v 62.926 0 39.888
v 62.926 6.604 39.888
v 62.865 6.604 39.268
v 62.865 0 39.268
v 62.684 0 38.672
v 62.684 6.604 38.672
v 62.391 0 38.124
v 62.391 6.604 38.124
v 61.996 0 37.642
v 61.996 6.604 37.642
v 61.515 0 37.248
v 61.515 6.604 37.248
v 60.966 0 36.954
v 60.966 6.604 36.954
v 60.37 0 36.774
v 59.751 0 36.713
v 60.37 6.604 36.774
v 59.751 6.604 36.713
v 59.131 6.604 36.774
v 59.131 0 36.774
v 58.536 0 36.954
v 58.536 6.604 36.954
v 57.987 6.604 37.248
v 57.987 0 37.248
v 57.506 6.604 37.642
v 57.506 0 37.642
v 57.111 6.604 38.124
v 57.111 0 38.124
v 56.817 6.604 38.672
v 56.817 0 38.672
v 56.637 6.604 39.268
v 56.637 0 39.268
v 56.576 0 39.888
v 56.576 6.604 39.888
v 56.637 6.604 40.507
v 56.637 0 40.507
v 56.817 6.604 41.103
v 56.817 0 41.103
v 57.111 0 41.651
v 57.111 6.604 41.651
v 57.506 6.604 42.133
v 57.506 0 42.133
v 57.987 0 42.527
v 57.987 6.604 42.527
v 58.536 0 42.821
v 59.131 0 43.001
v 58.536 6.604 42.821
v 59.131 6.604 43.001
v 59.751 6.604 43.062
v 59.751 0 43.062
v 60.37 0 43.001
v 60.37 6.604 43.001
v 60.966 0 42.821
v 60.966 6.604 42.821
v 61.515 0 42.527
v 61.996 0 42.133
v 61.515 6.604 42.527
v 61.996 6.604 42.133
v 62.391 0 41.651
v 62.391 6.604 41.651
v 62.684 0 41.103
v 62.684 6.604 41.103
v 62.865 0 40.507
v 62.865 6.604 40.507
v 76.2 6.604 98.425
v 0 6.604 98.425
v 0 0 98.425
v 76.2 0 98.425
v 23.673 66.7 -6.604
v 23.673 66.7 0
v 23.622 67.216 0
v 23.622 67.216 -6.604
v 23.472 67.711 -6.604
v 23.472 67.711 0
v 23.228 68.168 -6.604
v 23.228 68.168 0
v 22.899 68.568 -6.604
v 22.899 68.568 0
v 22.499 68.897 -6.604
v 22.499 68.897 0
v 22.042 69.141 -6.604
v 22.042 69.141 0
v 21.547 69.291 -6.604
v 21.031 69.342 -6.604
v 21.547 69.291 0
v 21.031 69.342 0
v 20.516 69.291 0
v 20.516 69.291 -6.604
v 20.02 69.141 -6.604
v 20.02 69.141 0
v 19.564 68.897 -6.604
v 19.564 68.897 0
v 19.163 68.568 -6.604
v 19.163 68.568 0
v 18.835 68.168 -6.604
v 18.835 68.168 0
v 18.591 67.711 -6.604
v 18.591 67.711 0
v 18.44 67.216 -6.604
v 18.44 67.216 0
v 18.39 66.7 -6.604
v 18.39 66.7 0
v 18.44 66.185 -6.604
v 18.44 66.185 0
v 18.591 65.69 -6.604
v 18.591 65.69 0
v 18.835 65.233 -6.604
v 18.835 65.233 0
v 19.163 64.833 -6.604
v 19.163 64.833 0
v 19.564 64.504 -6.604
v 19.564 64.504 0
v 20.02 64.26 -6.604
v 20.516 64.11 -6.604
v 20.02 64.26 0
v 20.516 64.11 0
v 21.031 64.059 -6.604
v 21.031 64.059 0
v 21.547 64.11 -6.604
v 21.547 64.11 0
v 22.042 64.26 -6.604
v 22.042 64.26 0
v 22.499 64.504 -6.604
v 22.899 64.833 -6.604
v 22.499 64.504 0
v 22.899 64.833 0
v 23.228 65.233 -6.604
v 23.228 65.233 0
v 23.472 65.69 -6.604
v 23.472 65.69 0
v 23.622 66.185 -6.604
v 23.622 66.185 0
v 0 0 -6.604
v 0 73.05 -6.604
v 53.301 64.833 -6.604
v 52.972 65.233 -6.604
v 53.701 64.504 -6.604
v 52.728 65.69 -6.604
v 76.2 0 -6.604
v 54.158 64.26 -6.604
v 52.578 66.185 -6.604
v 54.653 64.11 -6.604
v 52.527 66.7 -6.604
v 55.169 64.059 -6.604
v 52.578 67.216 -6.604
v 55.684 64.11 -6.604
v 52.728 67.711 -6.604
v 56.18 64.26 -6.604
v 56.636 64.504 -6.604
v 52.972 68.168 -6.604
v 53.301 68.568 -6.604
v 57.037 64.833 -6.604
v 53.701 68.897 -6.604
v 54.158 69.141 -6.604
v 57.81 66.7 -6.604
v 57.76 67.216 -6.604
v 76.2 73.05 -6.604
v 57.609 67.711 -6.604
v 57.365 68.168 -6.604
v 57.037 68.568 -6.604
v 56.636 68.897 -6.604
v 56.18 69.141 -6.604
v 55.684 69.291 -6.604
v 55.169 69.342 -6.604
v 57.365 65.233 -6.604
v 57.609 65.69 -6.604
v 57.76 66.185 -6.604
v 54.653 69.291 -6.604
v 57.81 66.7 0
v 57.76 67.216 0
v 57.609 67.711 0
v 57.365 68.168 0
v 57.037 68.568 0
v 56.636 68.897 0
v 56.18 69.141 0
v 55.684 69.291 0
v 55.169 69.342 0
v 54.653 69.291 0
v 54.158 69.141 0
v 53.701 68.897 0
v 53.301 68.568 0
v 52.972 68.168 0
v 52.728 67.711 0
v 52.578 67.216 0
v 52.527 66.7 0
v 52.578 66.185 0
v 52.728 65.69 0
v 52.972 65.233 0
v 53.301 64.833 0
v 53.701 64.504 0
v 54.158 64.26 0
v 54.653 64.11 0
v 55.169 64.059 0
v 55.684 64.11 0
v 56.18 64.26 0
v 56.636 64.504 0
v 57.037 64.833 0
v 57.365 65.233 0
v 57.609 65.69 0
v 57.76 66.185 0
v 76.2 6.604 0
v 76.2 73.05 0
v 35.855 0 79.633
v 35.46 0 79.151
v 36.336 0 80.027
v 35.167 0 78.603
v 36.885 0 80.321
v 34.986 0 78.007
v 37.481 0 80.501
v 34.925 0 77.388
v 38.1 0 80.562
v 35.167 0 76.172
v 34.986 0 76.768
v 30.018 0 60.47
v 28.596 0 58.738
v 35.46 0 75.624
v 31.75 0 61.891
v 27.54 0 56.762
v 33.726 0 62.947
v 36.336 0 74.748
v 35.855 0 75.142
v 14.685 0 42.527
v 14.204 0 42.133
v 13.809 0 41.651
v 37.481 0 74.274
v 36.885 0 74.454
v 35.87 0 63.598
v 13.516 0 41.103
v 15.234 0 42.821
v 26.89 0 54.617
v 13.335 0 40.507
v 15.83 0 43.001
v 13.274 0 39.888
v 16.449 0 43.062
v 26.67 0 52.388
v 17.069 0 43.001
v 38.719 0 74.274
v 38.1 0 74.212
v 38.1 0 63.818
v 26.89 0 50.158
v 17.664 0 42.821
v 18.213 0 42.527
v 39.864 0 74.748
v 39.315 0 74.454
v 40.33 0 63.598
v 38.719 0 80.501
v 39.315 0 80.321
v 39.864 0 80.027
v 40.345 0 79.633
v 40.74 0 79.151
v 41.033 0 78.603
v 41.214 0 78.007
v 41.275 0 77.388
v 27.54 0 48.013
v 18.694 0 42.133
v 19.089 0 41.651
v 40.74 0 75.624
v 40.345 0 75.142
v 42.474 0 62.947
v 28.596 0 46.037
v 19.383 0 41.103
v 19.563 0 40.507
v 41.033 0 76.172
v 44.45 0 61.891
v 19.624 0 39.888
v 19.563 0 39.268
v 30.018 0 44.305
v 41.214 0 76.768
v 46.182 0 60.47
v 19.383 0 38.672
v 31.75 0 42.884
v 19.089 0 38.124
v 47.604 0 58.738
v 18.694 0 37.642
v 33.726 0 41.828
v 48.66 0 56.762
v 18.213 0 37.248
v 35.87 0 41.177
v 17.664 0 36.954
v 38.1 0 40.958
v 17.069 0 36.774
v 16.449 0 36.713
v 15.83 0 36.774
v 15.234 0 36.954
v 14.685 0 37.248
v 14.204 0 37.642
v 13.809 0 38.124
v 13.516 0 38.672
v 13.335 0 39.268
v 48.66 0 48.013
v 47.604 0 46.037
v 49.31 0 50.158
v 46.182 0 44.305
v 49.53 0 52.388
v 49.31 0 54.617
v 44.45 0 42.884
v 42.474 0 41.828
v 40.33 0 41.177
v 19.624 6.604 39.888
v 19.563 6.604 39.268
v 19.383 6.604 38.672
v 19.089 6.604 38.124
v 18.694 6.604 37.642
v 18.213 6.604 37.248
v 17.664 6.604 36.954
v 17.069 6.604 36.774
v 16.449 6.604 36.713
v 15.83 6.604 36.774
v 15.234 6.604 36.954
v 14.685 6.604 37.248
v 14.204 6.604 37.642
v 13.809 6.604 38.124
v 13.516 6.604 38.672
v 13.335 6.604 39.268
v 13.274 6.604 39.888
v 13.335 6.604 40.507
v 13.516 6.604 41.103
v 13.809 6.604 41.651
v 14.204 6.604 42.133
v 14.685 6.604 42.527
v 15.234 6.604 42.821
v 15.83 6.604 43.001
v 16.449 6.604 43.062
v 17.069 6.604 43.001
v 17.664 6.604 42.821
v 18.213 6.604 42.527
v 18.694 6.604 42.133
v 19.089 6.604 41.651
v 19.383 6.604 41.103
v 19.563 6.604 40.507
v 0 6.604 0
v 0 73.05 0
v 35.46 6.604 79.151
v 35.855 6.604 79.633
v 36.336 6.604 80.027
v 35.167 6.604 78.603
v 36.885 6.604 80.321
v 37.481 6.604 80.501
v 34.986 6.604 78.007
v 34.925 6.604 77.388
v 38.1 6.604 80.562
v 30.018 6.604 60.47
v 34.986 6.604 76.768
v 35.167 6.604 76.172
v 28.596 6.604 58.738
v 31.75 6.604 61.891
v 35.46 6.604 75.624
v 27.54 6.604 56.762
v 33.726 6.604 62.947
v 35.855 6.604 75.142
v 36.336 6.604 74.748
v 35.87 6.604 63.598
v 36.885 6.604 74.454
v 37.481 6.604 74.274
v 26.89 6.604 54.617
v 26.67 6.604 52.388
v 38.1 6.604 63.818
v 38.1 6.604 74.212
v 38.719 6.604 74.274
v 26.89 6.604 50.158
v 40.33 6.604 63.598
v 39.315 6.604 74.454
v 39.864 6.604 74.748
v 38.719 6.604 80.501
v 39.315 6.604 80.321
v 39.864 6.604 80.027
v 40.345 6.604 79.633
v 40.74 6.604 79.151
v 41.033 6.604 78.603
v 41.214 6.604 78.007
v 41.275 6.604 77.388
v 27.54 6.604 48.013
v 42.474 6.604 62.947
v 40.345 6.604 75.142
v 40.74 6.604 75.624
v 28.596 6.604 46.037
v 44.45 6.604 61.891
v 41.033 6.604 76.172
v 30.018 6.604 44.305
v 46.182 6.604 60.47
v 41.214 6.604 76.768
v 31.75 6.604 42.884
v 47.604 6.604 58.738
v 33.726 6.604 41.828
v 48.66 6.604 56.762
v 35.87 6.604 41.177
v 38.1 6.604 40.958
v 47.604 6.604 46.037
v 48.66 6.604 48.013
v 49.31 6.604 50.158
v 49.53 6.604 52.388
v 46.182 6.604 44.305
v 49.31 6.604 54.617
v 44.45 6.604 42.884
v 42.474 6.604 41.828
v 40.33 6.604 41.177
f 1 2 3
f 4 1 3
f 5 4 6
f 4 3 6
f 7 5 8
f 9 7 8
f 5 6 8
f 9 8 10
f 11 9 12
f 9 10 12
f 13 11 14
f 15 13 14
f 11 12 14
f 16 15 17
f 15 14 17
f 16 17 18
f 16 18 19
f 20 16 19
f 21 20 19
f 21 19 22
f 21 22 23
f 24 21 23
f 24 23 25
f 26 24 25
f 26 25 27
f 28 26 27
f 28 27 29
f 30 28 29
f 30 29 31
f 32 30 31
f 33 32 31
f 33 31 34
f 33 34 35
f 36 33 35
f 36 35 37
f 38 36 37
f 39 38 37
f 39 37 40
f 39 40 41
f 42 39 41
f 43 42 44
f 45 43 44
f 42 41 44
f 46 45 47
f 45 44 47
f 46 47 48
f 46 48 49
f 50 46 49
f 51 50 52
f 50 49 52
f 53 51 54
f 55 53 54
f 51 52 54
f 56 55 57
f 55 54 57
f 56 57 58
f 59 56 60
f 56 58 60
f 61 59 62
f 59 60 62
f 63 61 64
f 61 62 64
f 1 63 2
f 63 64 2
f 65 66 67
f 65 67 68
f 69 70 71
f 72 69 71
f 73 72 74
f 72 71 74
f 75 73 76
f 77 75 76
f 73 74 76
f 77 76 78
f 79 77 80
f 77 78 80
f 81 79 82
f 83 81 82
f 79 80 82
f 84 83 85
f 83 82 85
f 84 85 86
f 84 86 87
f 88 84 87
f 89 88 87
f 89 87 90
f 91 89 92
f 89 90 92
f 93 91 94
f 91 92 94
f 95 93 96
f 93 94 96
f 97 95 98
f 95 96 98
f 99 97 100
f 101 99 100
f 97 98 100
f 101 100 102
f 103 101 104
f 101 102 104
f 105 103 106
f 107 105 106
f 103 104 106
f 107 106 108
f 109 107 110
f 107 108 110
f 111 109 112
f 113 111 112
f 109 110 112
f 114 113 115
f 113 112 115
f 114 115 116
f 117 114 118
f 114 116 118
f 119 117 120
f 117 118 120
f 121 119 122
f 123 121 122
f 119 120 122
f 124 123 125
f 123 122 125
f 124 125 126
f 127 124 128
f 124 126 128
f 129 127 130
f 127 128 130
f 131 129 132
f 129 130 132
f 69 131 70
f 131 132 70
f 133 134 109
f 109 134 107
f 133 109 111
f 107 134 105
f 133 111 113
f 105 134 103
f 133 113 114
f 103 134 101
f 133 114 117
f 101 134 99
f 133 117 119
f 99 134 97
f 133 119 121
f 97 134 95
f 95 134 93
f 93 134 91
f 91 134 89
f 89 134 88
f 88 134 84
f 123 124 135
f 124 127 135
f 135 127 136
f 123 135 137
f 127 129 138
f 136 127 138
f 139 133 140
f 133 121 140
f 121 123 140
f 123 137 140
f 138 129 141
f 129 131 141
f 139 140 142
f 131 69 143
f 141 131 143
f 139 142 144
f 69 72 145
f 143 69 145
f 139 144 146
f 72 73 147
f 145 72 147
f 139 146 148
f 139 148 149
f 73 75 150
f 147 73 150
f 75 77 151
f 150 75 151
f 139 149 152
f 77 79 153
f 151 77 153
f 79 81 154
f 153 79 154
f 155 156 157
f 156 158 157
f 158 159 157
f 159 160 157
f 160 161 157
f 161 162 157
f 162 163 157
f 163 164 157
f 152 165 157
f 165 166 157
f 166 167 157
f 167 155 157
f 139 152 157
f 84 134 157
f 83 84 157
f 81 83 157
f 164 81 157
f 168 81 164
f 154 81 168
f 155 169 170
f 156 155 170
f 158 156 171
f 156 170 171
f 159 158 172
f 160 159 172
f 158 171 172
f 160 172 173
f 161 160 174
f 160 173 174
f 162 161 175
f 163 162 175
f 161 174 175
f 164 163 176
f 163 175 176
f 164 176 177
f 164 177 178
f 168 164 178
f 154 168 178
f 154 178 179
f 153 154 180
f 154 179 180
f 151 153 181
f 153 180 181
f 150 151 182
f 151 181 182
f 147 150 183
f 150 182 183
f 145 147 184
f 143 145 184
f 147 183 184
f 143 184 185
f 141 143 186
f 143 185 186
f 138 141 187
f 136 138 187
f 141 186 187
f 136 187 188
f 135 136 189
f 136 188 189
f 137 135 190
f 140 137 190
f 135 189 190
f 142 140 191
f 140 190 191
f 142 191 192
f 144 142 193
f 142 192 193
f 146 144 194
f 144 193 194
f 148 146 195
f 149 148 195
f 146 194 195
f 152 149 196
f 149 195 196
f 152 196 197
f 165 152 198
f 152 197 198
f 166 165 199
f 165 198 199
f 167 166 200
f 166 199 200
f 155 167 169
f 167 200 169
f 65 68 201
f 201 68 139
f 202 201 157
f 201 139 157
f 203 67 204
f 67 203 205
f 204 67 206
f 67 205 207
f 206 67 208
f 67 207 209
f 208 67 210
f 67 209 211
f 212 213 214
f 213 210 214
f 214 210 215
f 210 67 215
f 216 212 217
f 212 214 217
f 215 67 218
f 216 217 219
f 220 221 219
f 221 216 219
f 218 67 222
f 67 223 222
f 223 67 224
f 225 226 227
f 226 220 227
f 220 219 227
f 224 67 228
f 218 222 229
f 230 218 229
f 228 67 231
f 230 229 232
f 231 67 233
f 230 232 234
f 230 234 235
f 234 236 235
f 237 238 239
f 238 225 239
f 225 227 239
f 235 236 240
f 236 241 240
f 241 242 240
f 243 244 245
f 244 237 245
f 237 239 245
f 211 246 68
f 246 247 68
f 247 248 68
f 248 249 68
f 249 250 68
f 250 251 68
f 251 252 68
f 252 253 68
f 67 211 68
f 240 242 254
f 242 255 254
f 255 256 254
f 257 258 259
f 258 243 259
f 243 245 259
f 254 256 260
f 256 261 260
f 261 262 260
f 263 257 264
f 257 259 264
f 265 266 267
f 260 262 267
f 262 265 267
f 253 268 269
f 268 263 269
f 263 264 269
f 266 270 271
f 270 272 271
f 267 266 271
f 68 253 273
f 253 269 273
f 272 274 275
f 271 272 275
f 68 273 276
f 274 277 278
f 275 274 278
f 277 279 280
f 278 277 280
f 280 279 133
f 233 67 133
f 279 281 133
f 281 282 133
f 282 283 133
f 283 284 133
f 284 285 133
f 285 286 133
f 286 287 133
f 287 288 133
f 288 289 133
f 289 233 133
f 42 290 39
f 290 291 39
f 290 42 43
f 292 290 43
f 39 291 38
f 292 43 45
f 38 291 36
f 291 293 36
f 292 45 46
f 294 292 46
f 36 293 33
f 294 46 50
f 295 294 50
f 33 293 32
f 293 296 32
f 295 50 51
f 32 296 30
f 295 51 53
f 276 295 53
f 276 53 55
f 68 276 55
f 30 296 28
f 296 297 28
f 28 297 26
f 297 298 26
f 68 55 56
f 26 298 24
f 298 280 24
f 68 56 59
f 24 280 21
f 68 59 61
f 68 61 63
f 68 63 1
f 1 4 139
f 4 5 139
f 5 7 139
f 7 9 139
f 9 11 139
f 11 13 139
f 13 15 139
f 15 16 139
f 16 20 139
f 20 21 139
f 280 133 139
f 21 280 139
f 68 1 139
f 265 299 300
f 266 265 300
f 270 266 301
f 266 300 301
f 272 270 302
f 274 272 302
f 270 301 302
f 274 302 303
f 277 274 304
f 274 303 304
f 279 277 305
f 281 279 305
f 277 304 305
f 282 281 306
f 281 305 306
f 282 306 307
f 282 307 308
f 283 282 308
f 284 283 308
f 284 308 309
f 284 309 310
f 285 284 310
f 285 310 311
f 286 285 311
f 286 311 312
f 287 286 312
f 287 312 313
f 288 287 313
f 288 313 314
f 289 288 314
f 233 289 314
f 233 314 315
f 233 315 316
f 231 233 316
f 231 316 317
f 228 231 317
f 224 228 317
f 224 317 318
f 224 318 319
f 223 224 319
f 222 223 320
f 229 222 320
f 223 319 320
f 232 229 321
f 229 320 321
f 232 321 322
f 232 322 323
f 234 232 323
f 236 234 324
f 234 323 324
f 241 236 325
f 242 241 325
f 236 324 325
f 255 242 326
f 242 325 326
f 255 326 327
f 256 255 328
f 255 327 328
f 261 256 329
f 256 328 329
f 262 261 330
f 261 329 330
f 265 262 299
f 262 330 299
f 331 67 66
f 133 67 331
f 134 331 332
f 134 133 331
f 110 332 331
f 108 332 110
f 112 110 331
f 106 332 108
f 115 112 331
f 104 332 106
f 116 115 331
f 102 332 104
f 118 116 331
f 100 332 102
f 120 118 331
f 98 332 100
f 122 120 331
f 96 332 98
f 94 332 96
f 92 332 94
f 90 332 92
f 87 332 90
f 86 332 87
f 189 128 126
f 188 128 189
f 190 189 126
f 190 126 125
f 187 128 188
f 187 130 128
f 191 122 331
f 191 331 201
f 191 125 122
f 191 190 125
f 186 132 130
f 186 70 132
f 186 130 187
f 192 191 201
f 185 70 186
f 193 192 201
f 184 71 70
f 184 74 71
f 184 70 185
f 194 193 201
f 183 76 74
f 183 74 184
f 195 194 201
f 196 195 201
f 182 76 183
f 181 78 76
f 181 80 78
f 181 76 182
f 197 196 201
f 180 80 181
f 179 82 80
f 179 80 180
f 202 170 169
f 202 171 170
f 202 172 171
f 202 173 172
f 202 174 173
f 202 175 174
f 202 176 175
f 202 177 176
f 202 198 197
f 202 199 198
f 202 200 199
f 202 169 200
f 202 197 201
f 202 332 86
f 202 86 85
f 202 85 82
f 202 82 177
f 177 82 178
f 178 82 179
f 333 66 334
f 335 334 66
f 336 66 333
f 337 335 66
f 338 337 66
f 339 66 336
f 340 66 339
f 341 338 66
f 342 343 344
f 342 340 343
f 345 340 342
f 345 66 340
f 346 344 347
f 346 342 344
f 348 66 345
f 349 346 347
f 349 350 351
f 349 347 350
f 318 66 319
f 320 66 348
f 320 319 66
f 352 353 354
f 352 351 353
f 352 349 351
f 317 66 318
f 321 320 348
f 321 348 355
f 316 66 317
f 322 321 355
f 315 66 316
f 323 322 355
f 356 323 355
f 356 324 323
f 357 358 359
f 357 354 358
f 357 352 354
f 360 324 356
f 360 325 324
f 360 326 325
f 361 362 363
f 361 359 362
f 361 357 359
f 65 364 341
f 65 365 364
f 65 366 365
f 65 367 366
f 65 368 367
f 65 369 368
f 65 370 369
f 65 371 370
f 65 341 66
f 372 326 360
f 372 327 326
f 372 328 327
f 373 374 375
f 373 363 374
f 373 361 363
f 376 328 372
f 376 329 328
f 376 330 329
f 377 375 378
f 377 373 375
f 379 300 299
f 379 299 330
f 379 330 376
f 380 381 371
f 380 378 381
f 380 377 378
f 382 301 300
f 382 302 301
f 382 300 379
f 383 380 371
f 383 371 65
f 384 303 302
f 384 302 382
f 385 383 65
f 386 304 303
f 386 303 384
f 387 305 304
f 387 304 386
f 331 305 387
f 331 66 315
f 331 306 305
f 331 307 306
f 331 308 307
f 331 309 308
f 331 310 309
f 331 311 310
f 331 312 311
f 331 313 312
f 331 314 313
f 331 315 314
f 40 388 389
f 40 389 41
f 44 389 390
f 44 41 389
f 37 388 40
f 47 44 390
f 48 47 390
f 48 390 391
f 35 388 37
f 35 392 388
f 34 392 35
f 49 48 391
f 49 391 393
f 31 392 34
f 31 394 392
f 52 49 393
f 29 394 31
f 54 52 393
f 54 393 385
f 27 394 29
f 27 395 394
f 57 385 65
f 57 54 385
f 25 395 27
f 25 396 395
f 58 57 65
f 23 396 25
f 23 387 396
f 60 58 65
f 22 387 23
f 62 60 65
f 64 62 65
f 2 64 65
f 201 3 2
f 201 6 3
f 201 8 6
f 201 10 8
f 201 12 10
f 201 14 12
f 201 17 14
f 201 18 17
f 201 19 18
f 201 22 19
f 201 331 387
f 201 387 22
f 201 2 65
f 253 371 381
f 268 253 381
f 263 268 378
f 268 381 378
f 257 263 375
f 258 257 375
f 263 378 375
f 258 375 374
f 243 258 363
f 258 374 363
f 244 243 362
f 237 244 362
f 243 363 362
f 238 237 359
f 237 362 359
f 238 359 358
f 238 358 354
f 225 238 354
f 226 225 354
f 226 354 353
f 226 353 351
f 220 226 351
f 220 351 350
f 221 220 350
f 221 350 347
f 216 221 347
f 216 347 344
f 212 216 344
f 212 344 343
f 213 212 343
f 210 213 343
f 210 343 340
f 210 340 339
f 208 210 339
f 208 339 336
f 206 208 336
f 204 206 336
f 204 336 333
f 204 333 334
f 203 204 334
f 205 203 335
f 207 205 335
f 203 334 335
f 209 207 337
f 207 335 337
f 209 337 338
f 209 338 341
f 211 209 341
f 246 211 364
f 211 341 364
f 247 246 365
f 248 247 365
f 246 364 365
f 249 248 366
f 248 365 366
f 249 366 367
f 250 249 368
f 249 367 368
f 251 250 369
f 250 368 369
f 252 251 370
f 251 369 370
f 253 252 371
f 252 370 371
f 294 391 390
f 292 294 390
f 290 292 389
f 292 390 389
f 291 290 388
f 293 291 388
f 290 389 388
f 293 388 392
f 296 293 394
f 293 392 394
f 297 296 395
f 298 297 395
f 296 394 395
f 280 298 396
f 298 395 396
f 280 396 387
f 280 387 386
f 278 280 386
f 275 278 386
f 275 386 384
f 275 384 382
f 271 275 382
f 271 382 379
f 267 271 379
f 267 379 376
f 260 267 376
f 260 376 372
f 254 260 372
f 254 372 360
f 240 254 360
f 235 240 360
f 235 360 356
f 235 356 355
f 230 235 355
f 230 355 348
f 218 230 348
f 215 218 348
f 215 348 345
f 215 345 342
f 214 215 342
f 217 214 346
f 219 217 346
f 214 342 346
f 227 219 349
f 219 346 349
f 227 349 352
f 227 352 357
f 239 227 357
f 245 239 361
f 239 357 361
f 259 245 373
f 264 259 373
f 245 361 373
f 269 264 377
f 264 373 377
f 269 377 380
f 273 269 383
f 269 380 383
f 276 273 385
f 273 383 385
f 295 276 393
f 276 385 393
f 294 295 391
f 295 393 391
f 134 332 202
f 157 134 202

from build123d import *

# Parameters (mm, degrees)
SKETCH1_W           = 76.2
SKETCH1_H           = 73.0504
SKETCH1_R           = 2.6416
BOSS_EXTRUDE1_DEPTH = 6.604
SKETCH2_W           = 76.2
SKETCH2_H           = 6.604
BOSS_EXTRUDE2_DEPTH = 98.425
SKETCH3_R           = 11.43
SKETCH3_R_2         = 3.175
CUT_EXTRUDE1_DEPTH  = 76.2


with BuildPart() as part:
    # Sketch1 → Boss-Extrude1 (new body)
    with BuildSketch(Plane.XY):
        with Locations((38.1, 36.5252)):
            Rectangle(SKETCH1_W, SKETCH1_H)
        with Locations((21.0312, 66.7004)):
            Circle(SKETCH1_R, mode=Mode.SUBTRACT)
        with Locations((55.1688, 66.7004)):
            Circle(SKETCH1_R, mode=Mode.SUBTRACT)
    extrude(amount=-BOSS_EXTRUDE1_DEPTH)

    # Sketch2 → Boss-Extrude2 (add)
    with BuildSketch(Plane.XY):
        with Locations((38.1, 3.302)):
            Rectangle(SKETCH2_W, SKETCH2_H)
    extrude(amount=BOSS_EXTRUDE2_DEPTH)

    # Sketch3 → Cut-Extrude1 (cut)
    with BuildSketch(Plane(origin=(0, 6.604, 0), x_dir=(1, 0, 0), z_dir=(0, 1, 0))):
        with Locations((38.1, -52.3875)):
            Circle(SKETCH3_R)
        with Locations((38.1, -77.3875)):
            Circle(SKETCH3_R_2)
        with Locations((16.449364905, -39.8875)):
            Circle(SKETCH3_R_2)
        with Locations((59.750635095, -39.8875)):
            Circle(SKETCH3_R_2)
    extrude(amount=-CUT_EXTRUDE1_DEPTH, mode=Mode.SUBTRACT)


solid = part.part
